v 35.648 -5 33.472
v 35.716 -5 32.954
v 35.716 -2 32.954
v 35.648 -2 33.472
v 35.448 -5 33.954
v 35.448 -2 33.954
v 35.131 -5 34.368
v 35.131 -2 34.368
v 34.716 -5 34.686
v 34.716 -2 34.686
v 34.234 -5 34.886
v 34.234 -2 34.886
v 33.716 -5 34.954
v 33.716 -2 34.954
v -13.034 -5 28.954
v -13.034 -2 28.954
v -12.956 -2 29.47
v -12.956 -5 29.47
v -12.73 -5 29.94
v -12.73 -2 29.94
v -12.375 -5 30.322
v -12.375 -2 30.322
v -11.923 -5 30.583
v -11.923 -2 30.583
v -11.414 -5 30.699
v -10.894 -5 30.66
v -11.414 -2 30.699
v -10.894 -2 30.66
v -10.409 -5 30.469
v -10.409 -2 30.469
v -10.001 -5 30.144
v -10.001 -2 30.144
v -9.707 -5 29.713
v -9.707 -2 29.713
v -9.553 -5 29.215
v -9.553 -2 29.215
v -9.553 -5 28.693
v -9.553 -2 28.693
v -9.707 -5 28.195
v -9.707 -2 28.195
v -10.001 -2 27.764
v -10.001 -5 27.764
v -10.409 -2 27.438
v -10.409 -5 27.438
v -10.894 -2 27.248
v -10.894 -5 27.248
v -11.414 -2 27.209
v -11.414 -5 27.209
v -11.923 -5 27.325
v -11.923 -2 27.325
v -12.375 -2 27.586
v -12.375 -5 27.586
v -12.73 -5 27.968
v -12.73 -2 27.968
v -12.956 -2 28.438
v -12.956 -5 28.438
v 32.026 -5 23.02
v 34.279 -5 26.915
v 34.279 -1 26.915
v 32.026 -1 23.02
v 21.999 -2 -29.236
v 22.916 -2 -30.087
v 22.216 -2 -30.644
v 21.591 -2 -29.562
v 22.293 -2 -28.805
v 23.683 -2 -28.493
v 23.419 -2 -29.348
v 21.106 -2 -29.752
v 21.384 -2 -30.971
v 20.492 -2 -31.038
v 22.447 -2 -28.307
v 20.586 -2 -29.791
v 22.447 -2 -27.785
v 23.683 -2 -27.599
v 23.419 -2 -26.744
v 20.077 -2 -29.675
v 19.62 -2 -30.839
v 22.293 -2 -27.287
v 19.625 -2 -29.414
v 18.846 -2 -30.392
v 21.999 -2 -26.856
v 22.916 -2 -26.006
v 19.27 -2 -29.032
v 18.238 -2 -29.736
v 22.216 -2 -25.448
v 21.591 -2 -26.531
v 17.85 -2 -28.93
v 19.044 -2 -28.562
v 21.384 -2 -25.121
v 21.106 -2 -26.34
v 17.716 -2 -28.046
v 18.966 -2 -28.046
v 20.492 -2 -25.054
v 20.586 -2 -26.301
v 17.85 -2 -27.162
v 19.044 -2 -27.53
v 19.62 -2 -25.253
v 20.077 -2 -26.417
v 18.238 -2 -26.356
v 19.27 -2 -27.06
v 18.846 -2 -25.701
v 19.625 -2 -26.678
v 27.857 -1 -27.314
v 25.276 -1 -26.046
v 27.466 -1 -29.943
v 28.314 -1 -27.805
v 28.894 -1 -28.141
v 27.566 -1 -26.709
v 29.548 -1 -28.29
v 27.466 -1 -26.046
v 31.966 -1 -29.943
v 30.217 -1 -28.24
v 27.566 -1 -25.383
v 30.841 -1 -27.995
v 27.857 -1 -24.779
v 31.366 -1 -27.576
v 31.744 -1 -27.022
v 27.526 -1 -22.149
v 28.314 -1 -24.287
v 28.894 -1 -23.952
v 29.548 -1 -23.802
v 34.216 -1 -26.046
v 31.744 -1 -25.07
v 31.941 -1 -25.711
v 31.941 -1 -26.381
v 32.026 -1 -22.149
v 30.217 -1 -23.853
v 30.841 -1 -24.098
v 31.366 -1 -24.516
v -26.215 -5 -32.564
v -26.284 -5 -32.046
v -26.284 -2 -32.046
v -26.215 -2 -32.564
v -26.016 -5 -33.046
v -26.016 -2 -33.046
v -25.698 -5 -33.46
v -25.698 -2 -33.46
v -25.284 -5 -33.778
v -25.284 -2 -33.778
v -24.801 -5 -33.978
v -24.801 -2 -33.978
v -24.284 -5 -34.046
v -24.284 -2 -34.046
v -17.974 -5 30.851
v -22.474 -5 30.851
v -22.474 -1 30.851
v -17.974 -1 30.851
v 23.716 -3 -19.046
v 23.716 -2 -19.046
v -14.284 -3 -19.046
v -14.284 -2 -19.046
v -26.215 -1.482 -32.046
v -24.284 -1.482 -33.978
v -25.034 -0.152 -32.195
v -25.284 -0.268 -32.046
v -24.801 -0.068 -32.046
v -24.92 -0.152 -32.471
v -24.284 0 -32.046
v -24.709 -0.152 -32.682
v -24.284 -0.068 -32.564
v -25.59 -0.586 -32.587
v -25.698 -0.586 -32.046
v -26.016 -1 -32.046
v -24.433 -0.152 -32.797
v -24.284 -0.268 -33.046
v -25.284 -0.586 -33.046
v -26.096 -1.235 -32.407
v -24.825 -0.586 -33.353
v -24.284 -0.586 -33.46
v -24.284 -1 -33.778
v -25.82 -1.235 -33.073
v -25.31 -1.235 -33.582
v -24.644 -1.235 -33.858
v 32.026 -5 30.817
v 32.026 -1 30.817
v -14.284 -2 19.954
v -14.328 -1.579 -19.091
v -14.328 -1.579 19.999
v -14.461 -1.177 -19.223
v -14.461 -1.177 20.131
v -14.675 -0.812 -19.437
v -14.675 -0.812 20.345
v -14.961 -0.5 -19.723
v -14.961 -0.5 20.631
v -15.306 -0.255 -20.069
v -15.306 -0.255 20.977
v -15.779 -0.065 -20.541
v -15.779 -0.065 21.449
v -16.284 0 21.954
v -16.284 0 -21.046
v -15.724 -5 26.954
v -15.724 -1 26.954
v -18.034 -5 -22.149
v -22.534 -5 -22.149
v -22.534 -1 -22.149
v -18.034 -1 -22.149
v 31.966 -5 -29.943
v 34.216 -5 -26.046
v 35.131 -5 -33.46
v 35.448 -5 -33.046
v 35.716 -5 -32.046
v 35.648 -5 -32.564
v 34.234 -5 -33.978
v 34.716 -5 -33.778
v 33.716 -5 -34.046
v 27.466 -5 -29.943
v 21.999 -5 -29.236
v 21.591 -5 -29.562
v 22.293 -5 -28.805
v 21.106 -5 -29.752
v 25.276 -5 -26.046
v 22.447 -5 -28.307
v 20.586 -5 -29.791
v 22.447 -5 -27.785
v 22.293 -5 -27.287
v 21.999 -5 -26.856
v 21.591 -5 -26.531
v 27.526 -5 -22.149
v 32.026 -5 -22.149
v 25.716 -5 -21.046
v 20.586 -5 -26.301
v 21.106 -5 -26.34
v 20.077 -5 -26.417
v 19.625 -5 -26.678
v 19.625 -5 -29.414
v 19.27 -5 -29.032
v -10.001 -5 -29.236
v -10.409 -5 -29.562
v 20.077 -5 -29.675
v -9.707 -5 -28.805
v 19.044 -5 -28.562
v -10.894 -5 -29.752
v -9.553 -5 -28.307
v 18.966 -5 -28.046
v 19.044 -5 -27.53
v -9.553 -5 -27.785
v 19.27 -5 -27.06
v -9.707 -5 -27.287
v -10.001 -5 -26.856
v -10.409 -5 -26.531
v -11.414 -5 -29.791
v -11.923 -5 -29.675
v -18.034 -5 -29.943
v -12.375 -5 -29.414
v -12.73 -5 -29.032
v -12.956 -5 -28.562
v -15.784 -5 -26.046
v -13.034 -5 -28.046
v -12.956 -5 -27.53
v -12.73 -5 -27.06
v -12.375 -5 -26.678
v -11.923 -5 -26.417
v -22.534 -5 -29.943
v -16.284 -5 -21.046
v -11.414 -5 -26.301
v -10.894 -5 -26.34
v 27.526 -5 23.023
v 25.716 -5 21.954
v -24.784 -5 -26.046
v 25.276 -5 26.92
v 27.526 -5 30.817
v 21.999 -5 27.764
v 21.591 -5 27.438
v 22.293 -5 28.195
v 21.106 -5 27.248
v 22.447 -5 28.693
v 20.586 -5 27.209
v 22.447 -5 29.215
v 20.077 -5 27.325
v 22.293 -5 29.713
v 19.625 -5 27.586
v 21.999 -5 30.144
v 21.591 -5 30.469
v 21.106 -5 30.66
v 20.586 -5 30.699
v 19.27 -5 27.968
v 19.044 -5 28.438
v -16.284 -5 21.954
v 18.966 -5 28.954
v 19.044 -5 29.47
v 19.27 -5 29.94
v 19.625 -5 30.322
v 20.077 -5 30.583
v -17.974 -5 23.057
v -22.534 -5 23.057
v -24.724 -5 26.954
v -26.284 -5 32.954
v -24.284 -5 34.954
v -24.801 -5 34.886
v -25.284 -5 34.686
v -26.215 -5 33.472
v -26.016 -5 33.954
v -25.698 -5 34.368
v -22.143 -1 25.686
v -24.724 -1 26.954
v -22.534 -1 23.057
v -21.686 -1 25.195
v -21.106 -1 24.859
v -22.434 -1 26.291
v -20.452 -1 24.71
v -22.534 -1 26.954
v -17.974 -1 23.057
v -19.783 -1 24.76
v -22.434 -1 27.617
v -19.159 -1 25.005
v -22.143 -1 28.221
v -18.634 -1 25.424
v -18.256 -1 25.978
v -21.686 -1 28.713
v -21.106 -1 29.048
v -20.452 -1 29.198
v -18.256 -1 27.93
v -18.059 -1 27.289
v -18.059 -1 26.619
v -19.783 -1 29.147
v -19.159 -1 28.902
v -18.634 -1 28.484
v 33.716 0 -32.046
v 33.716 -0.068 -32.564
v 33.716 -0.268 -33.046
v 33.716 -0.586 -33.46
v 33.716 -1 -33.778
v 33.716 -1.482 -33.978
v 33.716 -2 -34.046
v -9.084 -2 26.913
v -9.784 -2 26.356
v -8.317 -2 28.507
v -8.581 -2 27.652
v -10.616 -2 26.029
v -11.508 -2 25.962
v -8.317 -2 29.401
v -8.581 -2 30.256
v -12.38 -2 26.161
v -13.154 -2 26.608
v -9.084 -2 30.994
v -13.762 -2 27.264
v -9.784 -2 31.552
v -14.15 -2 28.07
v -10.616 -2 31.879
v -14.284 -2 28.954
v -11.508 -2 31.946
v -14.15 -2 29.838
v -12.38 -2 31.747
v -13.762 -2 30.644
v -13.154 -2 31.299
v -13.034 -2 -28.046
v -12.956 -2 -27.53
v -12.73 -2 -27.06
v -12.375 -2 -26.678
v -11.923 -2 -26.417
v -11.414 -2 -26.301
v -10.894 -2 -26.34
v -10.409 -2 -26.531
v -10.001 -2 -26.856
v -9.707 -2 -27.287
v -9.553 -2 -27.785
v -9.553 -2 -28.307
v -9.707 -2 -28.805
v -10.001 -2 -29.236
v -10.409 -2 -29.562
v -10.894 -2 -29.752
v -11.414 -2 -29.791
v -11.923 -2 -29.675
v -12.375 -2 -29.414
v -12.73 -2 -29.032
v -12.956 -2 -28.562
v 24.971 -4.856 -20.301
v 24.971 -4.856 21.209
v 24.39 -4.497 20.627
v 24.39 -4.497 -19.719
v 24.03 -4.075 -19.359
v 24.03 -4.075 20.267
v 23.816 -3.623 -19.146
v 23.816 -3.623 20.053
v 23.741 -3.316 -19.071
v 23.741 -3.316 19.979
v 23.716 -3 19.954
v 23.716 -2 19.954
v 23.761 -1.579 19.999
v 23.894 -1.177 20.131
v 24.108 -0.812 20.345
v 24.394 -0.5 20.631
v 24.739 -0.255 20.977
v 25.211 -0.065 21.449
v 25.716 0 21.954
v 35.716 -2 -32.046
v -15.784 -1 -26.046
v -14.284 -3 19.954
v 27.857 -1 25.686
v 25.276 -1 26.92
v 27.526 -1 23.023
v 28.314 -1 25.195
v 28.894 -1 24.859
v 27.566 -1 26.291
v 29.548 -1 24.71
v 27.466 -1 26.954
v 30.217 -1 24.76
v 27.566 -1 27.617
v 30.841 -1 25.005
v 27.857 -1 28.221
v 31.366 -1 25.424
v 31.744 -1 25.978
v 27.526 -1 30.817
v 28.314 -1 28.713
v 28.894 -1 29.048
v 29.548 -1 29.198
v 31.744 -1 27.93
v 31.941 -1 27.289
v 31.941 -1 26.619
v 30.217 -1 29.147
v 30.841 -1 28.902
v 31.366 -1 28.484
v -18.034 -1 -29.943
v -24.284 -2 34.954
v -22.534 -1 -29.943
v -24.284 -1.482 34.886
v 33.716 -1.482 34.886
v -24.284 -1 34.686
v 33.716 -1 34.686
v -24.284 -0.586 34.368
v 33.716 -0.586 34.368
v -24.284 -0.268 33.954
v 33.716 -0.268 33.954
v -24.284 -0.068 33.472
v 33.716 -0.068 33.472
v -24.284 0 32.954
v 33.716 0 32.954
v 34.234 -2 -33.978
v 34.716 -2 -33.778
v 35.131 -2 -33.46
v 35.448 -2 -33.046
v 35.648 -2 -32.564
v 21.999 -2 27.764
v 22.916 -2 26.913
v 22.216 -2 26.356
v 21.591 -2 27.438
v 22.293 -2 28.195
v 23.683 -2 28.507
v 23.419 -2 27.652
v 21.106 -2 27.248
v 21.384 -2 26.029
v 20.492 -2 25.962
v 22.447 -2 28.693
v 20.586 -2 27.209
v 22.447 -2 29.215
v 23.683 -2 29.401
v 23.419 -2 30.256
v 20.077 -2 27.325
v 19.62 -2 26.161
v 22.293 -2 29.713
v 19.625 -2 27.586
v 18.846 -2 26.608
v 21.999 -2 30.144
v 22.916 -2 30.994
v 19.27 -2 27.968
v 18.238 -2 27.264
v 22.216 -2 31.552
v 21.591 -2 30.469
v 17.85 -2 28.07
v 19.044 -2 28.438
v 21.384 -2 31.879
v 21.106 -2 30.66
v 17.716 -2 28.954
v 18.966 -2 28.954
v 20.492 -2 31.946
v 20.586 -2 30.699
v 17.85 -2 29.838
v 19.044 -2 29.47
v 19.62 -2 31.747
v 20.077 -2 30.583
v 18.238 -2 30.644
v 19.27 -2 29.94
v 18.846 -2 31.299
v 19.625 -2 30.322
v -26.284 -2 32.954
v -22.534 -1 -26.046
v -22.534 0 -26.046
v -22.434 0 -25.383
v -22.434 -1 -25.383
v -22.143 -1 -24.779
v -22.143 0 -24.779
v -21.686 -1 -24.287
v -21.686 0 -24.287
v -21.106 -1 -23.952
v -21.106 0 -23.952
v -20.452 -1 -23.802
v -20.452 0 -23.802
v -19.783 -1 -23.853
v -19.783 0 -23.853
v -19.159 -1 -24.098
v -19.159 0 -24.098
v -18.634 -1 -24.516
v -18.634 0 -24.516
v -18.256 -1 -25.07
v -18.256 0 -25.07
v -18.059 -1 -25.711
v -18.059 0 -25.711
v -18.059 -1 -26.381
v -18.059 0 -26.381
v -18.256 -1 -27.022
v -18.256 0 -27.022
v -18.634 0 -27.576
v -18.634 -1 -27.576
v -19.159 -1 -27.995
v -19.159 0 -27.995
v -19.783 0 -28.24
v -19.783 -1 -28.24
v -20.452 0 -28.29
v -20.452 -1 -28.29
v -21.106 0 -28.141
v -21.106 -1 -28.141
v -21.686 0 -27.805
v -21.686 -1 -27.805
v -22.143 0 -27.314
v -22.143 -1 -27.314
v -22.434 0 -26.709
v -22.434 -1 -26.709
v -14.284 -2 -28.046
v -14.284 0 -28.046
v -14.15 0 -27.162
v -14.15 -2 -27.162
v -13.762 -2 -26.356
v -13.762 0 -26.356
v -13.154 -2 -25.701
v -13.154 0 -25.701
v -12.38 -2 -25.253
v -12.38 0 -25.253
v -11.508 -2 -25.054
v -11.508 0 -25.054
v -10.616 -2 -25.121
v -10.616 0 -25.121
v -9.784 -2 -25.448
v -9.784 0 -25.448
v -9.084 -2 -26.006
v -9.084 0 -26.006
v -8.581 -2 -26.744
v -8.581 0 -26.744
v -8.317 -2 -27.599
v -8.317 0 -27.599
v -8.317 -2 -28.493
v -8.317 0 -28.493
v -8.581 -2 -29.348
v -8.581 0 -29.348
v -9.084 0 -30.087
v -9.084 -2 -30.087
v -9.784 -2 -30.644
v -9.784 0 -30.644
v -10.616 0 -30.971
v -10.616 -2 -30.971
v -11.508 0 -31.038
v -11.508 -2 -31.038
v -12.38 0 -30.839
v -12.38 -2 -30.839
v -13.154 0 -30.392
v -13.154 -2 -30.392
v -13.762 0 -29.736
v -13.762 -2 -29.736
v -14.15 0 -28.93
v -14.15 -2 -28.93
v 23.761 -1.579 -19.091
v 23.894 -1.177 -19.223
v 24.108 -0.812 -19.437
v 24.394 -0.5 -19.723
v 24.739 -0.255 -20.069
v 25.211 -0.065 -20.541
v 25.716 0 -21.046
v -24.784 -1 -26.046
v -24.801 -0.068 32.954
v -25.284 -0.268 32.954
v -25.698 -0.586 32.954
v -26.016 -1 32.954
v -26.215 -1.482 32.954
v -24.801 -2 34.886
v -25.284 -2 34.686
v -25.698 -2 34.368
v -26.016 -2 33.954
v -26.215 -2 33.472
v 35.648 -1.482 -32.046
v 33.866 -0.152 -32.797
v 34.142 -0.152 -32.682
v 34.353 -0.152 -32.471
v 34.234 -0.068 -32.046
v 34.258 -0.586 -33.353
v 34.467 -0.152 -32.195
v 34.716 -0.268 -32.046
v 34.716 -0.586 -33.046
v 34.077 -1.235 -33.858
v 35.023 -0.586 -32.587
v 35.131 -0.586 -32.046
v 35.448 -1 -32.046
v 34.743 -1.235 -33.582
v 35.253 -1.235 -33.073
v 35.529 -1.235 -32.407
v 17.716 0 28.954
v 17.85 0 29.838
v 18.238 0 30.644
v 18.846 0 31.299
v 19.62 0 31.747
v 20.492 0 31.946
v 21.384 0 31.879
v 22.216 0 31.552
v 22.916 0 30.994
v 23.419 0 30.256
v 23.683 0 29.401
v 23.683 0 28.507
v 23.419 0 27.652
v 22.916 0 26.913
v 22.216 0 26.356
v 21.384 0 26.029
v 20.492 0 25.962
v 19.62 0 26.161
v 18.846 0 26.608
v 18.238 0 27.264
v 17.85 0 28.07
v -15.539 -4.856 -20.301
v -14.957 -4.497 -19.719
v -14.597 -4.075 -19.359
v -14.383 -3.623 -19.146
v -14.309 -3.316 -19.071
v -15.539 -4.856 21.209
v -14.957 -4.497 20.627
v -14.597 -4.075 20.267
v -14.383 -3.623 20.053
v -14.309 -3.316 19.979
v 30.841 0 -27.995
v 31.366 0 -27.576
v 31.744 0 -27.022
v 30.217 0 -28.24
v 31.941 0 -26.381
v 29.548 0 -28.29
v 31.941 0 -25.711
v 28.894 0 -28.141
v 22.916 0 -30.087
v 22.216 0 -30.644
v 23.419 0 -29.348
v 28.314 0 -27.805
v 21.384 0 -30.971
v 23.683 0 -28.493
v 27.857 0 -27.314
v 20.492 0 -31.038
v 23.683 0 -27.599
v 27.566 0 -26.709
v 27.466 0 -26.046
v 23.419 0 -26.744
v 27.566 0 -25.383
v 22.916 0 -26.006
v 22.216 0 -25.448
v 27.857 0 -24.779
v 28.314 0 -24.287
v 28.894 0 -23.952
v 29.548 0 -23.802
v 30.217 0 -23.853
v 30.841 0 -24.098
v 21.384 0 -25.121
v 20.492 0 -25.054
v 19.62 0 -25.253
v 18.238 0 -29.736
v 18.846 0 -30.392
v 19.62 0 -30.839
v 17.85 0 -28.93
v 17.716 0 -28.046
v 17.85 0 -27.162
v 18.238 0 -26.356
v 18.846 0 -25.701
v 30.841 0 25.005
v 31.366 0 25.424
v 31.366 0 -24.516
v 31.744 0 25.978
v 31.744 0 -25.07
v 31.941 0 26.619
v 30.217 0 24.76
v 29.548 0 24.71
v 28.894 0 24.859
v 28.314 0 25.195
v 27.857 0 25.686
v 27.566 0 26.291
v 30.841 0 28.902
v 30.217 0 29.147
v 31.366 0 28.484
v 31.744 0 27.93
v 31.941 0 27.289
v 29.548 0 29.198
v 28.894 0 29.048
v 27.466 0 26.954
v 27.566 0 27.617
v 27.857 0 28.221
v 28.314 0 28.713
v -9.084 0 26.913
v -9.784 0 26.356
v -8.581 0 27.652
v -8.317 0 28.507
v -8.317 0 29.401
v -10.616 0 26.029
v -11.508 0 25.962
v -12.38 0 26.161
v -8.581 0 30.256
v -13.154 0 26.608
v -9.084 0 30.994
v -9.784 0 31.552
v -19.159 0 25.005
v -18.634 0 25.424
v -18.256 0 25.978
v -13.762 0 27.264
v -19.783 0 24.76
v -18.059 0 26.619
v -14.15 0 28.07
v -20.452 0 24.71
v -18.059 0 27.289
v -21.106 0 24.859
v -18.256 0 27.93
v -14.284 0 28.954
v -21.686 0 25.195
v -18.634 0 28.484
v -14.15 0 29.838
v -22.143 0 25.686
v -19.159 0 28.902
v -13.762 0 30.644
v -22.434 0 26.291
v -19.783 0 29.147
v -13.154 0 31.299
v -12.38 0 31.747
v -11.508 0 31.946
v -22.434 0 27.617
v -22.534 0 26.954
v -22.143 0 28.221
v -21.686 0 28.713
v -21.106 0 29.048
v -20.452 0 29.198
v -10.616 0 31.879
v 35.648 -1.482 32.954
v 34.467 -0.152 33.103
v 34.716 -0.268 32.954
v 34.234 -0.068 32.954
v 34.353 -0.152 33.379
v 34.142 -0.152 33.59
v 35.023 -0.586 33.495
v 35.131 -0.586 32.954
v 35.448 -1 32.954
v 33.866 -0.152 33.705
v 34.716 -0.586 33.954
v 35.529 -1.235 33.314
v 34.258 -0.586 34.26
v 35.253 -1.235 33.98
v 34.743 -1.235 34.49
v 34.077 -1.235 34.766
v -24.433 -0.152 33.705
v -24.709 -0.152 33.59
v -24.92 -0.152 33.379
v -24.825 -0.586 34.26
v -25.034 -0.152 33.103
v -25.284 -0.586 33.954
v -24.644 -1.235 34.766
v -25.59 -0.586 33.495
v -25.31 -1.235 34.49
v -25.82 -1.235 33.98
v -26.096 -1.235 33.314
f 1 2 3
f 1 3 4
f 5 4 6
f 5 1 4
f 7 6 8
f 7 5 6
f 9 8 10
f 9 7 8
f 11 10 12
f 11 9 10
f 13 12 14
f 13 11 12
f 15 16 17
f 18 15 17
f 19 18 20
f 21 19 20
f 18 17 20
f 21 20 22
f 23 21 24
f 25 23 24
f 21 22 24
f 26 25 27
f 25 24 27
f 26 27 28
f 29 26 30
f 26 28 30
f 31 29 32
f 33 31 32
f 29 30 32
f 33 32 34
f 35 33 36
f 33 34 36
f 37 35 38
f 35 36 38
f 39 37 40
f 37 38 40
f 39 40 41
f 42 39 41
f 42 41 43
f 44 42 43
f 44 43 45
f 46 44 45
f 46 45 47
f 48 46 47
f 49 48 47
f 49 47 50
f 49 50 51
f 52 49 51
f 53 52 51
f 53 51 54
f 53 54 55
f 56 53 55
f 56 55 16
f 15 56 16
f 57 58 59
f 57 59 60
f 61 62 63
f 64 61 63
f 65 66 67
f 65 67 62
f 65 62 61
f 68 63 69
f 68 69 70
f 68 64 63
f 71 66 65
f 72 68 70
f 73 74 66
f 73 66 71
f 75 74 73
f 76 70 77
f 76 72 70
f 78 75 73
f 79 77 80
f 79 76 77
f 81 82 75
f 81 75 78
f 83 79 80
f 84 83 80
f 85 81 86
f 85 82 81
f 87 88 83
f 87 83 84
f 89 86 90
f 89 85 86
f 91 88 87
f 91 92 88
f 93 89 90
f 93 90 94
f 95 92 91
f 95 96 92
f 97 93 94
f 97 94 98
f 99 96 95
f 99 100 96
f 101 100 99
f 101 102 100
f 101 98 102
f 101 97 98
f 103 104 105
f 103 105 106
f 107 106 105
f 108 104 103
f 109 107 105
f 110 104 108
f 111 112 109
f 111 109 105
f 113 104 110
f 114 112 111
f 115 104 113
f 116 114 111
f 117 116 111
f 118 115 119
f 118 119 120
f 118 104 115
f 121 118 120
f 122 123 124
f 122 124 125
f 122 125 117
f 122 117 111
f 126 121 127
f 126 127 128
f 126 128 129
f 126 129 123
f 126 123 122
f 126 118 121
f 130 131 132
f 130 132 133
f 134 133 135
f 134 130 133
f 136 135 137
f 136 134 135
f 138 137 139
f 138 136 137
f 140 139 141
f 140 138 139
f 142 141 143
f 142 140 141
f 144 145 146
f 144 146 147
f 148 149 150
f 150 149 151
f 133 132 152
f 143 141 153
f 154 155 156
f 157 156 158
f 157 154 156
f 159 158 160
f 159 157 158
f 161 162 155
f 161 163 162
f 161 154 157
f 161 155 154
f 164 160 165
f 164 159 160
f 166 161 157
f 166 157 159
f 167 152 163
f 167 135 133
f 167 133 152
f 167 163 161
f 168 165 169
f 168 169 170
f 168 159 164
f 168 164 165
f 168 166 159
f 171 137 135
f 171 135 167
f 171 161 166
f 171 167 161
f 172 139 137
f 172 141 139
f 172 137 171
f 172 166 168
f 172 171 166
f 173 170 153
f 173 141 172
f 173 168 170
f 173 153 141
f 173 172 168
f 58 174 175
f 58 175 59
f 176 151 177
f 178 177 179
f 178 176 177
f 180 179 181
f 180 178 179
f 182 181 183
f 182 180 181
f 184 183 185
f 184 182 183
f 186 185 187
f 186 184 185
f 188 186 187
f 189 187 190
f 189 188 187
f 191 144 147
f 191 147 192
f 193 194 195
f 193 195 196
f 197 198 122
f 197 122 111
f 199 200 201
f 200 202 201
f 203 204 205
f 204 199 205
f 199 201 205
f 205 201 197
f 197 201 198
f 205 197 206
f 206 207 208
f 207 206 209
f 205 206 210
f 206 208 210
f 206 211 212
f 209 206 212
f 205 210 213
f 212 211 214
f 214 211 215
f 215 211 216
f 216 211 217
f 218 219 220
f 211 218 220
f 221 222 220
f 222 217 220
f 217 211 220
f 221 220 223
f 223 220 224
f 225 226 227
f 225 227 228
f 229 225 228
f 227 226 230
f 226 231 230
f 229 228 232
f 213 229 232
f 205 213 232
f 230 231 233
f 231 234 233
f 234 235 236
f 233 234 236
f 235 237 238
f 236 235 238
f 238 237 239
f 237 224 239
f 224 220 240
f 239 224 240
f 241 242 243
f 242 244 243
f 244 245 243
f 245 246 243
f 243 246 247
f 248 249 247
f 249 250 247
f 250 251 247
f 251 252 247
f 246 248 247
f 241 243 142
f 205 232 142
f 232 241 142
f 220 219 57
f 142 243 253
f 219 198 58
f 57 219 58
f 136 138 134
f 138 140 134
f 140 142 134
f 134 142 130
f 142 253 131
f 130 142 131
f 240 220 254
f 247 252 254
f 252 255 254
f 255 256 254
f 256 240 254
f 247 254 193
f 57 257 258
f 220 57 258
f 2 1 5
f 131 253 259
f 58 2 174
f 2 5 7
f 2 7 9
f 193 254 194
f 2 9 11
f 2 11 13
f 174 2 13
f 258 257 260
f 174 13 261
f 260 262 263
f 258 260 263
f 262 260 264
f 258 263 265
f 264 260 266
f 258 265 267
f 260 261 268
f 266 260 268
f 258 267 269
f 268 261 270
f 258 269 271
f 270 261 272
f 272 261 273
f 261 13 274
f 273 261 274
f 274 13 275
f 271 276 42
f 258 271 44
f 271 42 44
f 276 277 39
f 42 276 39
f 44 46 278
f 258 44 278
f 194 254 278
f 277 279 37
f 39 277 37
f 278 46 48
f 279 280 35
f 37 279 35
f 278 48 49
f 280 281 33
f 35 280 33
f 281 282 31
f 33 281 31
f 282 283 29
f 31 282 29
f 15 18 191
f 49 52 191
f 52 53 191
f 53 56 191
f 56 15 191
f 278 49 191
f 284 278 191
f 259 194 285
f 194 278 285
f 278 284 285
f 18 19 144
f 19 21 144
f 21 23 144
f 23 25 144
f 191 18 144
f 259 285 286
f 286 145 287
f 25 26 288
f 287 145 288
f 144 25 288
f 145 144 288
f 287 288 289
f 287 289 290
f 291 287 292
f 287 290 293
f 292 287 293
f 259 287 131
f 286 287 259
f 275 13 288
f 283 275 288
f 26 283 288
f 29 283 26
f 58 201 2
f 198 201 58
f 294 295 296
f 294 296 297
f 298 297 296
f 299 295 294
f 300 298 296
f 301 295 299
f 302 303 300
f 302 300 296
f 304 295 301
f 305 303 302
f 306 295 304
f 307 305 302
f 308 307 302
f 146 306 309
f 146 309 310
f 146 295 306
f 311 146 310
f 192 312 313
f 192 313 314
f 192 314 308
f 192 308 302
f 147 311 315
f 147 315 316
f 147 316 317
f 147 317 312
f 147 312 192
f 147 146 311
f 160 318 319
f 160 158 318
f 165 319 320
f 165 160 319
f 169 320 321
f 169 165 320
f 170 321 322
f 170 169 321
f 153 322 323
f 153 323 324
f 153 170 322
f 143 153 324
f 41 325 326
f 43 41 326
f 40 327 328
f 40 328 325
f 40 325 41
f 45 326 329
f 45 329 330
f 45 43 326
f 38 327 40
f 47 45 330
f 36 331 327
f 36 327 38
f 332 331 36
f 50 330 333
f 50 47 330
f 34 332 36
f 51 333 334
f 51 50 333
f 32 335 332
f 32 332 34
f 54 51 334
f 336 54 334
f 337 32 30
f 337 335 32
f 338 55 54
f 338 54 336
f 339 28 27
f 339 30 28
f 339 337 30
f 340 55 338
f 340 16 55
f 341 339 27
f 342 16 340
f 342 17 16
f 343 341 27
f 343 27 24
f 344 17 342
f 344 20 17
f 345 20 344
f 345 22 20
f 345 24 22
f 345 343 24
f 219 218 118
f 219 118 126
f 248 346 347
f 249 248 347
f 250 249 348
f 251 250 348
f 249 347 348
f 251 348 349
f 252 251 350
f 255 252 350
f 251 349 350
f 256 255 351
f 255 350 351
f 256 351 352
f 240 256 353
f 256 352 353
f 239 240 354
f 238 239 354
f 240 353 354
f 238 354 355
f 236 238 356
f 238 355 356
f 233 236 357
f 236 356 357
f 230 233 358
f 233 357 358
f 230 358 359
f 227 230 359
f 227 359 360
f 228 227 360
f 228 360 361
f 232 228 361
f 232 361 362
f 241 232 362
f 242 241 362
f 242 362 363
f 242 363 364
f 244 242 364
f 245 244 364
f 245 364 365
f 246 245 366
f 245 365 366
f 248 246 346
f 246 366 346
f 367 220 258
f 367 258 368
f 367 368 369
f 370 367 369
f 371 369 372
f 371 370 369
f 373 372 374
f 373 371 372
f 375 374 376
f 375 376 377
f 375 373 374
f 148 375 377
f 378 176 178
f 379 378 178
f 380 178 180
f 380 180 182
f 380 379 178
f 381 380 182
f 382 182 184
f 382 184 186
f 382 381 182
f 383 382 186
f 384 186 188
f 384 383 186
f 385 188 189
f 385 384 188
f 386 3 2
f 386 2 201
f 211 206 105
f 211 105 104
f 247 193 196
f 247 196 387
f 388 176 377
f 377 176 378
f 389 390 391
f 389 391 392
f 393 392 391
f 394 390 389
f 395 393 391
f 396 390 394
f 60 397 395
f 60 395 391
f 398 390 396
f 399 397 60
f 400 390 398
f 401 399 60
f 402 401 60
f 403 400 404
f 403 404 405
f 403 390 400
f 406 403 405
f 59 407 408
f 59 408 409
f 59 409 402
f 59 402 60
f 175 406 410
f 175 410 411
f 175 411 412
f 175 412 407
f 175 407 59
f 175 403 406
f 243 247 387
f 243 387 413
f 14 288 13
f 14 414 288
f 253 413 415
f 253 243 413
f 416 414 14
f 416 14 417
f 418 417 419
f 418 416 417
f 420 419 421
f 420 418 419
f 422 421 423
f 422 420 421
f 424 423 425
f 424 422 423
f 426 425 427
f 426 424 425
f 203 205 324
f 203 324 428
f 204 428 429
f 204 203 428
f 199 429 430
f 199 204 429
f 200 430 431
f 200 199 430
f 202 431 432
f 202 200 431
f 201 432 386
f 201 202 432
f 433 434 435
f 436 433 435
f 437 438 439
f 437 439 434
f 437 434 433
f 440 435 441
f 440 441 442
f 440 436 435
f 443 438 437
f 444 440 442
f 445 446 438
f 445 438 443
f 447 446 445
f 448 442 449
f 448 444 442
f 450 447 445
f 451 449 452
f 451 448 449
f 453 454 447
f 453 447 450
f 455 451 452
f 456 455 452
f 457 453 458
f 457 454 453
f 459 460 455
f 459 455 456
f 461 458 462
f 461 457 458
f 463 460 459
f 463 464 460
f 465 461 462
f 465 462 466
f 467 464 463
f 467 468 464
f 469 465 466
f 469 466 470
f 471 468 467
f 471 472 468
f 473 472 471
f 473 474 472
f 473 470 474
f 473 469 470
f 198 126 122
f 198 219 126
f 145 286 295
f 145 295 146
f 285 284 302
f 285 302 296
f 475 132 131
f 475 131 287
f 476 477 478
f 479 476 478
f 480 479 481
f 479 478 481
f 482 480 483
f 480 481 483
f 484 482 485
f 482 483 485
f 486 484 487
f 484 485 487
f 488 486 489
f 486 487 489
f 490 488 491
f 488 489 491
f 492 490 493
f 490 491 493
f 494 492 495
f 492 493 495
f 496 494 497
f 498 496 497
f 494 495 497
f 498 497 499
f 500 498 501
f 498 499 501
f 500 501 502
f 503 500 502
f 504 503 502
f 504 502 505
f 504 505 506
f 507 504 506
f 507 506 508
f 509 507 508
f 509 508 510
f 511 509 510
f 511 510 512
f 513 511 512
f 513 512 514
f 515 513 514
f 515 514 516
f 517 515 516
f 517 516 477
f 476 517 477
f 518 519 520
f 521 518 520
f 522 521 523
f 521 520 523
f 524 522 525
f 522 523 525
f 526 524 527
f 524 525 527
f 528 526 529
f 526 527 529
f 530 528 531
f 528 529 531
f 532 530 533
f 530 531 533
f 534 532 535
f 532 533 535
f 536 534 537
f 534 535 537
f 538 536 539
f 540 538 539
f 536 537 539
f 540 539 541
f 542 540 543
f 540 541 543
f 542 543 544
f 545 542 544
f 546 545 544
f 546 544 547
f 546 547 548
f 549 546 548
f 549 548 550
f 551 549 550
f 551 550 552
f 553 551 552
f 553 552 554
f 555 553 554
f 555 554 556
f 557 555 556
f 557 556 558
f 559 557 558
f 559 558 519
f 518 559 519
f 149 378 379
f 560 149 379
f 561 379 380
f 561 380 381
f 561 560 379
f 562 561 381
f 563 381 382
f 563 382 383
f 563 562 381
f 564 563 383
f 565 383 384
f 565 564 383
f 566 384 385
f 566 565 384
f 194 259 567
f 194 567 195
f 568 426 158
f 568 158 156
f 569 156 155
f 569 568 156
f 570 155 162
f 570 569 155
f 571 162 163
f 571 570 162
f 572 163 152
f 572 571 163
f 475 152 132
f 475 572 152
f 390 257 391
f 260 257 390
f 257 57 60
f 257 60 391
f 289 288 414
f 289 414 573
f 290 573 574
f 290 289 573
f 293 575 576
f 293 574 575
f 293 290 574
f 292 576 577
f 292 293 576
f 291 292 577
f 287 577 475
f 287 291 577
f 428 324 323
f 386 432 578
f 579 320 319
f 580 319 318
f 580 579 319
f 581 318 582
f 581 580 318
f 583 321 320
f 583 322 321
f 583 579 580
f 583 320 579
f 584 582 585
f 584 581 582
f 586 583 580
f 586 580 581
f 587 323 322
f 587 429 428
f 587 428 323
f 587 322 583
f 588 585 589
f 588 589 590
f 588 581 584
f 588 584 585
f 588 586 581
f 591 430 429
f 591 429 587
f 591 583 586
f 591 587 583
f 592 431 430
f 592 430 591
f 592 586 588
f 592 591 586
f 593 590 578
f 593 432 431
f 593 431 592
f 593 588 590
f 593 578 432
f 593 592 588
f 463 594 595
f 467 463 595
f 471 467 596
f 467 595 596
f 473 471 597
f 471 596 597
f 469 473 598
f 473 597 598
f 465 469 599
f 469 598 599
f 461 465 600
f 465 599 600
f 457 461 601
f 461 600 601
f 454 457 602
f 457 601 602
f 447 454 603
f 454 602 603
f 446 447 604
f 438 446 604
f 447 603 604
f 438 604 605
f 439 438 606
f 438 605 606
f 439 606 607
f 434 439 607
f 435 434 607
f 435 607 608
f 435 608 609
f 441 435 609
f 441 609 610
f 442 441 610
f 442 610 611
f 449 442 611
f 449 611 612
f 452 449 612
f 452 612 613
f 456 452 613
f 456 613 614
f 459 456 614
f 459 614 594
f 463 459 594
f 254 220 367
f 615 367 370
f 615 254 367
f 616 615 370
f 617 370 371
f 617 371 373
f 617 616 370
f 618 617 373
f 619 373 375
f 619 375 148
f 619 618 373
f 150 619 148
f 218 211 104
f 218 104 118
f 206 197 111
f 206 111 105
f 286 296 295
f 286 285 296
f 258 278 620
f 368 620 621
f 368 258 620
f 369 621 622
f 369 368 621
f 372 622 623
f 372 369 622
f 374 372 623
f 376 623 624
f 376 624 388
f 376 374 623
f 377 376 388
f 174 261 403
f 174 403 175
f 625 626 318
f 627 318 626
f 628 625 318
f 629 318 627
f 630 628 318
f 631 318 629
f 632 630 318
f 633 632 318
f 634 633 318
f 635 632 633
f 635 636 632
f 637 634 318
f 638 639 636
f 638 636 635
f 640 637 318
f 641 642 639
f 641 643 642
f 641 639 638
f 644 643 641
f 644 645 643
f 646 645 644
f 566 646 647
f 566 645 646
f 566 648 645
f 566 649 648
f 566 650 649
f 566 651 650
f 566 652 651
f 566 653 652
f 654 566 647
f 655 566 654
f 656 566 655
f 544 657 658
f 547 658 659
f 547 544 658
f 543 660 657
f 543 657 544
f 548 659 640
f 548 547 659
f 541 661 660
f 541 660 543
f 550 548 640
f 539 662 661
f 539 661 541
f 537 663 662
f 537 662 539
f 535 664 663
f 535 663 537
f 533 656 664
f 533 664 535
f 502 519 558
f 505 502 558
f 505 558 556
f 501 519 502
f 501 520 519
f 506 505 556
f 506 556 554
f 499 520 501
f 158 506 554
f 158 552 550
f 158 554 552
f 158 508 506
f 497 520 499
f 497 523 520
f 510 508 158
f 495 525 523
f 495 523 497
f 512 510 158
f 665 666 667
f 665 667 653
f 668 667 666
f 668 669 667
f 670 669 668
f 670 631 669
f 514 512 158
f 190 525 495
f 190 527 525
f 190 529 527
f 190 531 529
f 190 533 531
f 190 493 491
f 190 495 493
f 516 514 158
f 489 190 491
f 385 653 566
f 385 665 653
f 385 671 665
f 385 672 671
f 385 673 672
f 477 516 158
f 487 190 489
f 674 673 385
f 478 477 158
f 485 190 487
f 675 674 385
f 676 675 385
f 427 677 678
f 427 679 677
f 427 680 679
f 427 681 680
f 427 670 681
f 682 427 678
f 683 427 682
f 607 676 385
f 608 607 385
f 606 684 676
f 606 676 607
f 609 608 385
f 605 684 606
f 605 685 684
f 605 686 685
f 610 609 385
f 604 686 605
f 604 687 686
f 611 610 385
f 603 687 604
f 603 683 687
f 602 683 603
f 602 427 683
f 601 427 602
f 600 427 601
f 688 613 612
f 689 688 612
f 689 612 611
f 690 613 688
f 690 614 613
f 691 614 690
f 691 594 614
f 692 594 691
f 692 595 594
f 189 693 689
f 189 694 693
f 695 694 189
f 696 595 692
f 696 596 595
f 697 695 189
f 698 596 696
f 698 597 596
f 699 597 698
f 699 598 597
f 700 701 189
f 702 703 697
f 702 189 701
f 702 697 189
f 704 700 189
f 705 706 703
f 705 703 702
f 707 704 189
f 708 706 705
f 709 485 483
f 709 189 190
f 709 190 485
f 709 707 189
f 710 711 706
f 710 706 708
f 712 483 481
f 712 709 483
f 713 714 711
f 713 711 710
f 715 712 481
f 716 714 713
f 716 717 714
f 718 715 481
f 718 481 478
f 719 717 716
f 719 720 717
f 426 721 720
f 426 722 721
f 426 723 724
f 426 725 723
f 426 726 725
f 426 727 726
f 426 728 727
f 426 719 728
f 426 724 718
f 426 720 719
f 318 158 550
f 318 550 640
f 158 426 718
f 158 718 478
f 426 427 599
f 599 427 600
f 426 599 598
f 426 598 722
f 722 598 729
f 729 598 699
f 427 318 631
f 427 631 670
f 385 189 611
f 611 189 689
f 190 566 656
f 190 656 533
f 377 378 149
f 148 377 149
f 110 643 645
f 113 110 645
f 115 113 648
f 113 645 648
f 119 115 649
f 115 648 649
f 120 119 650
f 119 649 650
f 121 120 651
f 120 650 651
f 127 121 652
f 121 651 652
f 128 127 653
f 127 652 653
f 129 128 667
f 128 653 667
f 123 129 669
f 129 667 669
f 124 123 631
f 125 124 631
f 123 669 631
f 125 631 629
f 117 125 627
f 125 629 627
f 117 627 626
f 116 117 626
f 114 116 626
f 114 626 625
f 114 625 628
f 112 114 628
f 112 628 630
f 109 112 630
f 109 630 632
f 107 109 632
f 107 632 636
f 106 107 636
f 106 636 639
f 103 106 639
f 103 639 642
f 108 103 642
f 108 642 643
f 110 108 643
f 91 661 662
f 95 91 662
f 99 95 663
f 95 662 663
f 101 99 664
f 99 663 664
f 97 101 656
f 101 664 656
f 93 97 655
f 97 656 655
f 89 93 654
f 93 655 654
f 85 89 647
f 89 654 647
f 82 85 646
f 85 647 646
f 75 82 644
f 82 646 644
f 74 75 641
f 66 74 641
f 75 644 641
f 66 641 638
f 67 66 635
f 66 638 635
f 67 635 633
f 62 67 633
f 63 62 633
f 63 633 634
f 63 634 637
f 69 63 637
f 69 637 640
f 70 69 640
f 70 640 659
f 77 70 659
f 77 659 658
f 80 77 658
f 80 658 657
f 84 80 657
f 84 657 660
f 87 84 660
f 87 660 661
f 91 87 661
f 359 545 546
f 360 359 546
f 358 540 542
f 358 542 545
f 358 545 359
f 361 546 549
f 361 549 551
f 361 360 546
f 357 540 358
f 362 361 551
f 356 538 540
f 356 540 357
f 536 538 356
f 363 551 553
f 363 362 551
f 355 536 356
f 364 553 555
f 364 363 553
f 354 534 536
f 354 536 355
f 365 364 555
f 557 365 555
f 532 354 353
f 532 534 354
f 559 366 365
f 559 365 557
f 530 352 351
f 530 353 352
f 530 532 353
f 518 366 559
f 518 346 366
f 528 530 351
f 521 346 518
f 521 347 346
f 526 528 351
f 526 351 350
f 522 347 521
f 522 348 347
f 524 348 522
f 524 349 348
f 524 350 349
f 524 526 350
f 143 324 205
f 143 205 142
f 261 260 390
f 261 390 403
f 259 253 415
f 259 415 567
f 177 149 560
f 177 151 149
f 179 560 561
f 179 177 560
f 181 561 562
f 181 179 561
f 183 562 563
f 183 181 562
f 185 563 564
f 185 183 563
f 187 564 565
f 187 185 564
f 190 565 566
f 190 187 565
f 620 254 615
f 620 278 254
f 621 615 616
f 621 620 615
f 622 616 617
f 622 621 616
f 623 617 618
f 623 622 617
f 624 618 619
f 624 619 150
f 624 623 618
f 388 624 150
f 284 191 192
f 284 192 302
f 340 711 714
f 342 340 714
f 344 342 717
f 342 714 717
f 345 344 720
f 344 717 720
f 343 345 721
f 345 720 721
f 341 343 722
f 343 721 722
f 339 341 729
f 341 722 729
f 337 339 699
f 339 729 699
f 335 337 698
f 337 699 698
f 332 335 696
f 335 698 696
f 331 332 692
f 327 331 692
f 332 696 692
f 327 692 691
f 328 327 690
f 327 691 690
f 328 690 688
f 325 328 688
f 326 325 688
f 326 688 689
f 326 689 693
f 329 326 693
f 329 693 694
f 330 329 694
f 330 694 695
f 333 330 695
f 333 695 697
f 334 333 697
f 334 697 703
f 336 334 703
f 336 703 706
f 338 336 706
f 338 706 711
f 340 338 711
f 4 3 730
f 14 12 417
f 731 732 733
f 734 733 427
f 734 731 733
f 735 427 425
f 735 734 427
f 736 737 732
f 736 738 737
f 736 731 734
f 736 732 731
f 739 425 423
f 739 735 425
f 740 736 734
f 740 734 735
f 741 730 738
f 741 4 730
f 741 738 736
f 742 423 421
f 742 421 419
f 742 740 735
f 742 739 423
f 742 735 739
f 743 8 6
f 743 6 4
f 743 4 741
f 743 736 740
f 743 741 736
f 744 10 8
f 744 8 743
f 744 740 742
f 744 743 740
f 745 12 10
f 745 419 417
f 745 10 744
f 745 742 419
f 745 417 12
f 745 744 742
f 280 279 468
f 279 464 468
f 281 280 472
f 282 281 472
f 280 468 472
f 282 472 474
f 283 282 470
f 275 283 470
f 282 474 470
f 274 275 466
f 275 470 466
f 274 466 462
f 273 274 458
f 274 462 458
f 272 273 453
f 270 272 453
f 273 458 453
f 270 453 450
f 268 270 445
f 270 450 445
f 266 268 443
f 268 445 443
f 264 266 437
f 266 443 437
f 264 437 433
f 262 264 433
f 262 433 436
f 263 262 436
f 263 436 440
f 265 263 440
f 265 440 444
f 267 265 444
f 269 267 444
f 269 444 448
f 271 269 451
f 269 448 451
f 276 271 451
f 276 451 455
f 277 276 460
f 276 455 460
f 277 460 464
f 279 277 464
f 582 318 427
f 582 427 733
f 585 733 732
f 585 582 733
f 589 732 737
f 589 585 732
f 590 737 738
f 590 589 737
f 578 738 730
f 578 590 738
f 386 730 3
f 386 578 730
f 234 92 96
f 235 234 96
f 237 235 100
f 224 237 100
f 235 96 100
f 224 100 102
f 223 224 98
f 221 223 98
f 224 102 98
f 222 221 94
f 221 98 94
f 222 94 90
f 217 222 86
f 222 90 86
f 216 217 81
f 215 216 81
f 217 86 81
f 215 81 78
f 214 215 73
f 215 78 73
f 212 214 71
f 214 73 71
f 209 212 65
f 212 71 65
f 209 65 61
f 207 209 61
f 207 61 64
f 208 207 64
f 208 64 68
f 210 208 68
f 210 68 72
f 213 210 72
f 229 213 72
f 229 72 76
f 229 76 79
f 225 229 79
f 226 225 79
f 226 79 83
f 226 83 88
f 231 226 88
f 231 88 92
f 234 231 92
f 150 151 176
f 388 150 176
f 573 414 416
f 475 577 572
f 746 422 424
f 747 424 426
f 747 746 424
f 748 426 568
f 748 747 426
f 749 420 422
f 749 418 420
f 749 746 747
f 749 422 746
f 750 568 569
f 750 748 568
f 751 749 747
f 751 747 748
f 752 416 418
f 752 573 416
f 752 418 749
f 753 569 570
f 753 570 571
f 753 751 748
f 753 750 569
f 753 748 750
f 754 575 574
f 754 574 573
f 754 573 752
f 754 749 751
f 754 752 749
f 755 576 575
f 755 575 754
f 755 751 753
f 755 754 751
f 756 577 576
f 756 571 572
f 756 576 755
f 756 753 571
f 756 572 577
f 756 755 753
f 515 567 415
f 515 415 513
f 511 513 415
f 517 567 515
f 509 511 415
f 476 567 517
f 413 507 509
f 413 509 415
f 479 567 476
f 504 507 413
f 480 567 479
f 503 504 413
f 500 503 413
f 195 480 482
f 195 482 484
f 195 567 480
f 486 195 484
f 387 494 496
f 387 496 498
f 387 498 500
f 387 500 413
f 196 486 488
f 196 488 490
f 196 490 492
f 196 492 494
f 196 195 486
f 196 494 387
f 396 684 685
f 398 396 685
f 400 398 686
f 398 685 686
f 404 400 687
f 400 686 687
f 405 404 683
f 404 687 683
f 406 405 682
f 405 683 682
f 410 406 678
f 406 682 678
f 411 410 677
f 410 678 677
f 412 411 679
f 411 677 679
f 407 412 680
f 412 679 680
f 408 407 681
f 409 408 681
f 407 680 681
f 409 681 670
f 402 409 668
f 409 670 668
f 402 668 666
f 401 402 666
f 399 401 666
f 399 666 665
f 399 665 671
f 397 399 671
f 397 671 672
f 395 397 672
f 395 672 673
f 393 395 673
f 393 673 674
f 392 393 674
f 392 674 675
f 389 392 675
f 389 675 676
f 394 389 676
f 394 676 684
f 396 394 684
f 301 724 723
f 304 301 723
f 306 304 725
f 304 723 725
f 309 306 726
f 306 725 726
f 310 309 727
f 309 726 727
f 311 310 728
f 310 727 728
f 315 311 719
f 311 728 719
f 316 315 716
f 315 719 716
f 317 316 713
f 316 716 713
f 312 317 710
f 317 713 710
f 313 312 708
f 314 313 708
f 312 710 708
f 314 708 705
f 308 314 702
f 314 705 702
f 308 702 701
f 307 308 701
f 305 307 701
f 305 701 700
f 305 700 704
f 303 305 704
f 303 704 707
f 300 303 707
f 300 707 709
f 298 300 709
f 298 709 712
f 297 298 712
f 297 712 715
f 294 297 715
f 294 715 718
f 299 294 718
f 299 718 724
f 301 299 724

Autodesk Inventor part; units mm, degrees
ref_plane "YZ Plane" through (0, 0, 0) normal (1, 0, 0) x (0, 1, 0)
ref_plane "XZ Plane" through (0, 0, 0) normal (0, 1, 0) x (-1, 0, 0)
ref_plane "XY Plane" through (0, 0, 0) normal (0, 0, 1) x (1, 0, 0)
sketch "Sketch1" plane through (0, 0, 0) normal (0, 1, 0) x (-1, 0, 0)
  line L0 (26.2836, 34.9539) -> (-35.7164, 34.9539)
  line L1 (-35.7164, 34.9539) -> (-35.7164, -34.0461)
  line L2 (-35.7164, -34.0461) -> (26.2836, -34.0461)
  line L3 (26.2836, -34.0461) -> (26.2836, 34.9539)
  circle A0 centre (11.2836, -28.0461) radius 1.75
  circle A1 centre (11.2836, -28.0461) radius 3
  circle A2 centre (-20.7164, -28.0461) radius 1.75
  circle A3 centre (-20.7164, -28.0461) radius 3
  circle A4 centre (-20.7164, 28.9539) radius 1.75
  circle A5 centre (-20.7164, 28.9539) radius 3
  circle A6 centre (11.2836, 28.9539) radius 1.75
  circle A7 centre (11.2836, 28.9539) radius 3
  line L4 (-15.7164, 34.9539) -> (-25.7164, 34.9539)
  circle A8 centre (20.2836, 26.9539) radius 2.25
  circle A9 centre (20.2836, -26.0461) radius 2.25
  circle A10 centre (-29.7164, 26.9539) radius 2.25
  circle A11 centre (-29.7164, -26.0461) radius 2.25
  circle A12 centre (20.2836, 26.9539) radius 4.5
  circle A13 centre (20.2836, -26.0461) radius 4.5
  circle A14 centre (-29.7164, -26.0461) radius 4.5
  circle A15 centre (-29.7164, 26.9539) radius 4.5
  line L5 (18.0336, 23.0568) -> (15.7836, 26.9539)
  line L6 (15.7836, 26.9539) -> (18.0336, 30.8511)
  line L7 (18.0336, 30.8511) -> (22.5336, 30.8511)
  line L8 (22.5336, 30.8511) -> (24.7836, 26.9539)
  line L9 (24.7836, 26.9539) -> (22.5336, 23.0568)
  line L10 (22.5336, 23.0568) -> (18.0336, 23.0568)
  line L11 (18.0336, -29.9432) -> (15.7836, -26.0461)
  line L12 (15.7836, -26.0461) -> (18.0336, -22.1489)
  line L13 (18.0336, -22.1489) -> (22.5336, -22.1489)
  line L14 (22.5336, -22.1489) -> (24.7836, -26.0461)
  line L15 (24.7836, -26.0461) -> (22.5336, -29.9432)
  line L16 (22.5336, -29.9432) -> (18.0336, -29.9432)
  line L17 (-31.9664, -29.9432) -> (-34.2164, -26.0461)
  line L18 (-34.2164, -26.0461) -> (-31.9664, -22.1489)
  line L19 (-31.9664, -22.1489) -> (-27.4664, -22.1489)
  line L20 (-27.4664, -22.1489) -> (-25.2164, -26.0461)
  line L21 (-25.2164, -26.0461) -> (-27.4664, -29.9432)
  line L22 (-27.4664, -29.9432) -> (-31.9664, -29.9432)
  line L23 (-31.9664, 23.0568) -> (-34.2164, 26.9539)
  line L24 (-34.2164, 26.9539) -> (-31.9664, 30.8511)
  line L25 (-31.9664, 30.8511) -> (-27.4664, 30.8511)
  line L26 (-27.4664, 30.8511) -> (-25.2164, 26.9539)
  line L27 (-25.2164, 26.9539) -> (-27.4664, 23.0568)
  line L28 (-27.4664, 23.0568) -> (-31.9664, 23.0568)
  point P0 (0, 0)
  dimension "d45" = 9
  dimension "d46" = 9
  dimension "d47" = 9
  dimension "d48" = 9
  dimension "d0" = 69
  dimension "d1" = 62
  dimension "d2" = 3.5
  dimension "d3" = 6
  dimension "d4" = 3.5
  dimension "d5" = 6
  dimension "d6" = 3.5
  dimension "d7" = 6
  dimension "d8" = 3.5
  dimension "d9" = 6
  dimension "d10" = 15
  dimension "d11" = 15
  dimension "d12" = 15
  dimension "d13" = 15
  dimension "d14" = 6
  dimension "d15" = 6
  dimension "d16" = 6
  dimension "d17" = 6
  dimension "d32" = 4.5
  dimension "d33" = 4.5
  dimension "d34" = 4.5
  dimension "d35" = 4.5
  dimension "d36" = 8
  dimension "d37" = 8
  dimension "d38" = 8
  dimension "d39" = 8
  dimension "d40" = 6
  dimension "d41" = 6
  dimension "d42" = 6
  dimension "d43" = 6
  dimension "d44" = 53
extrude "Extrusion1" add sketch "Sketch1" against normal blind 5 contours L3 L2 L1 L0 | A1 | A3 | A5 | A7 | L8 A12 | L9 L10 L5 L6 L7 L8 | A12 L9 | L7 A12 | A12 L10 | L6 A12 | A12 L5 | L14 A13 | L15 L16 L11 L12 L13 L14 | A13 L15 | L13 A13 | A13 L16 | L12 A13 | A13 L11 | L20 A14 | L21 L22 L17 L18 L19 L20 | A14 L21 | L19 A14 | A14 L22 | L18 A14 | A14 L17 | L26 A15 | L27 L28 L23 L24 L25 L26 | A15 L27 | L25 A15 | A15 L28 | L24 A15 | A15 L23
extrude "Extrusion2" cut sketch "Sketch1" against normal blind 2 contours A1 | A3 | A5 | A7
sketch "Sketch2" plane through (0, -5, 0) normal (0, -1, 0) x (1, 0, 0)
  line L0 (27.5264, 23.0228) -> (25.2764, 26.92)
  line L1 (25.2764, 26.92) -> (27.5264, 30.8171)
  line L2 (27.5264, 30.8171) -> (32.0264, 30.8171)
  line L3 (32.0264, 30.8171) -> (34.279, 26.9154)
  line L4 (34.279, 26.9154) -> (32.0264, 23.0198)
  line L5 (32.0264, 23.0198) -> (27.5264, 23.0228)
  line L6 (27.4664, -29.9432) -> (25.2764, -26.0461)
  line L7 (25.2764, -26.0461) -> (27.5264, -22.1489)
  line L8 (27.5264, -22.1489) -> (32.0264, -22.1489)
  line L9 (32.0264, -22.1489) -> (34.2164, -26.0461)
  line L10 (34.2164, -26.0461) -> (31.9664, -29.9432)
  line L11 (31.9664, -29.9432) -> (27.4664, -29.9432)
  line L12 (-22.5336, -29.9432) -> (-24.7836, -26.0461)
  line L13 (-24.7836, -26.0461) -> (-22.5336, -22.1489)
  line L14 (-22.5336, -22.1489) -> (-18.0336, -22.1489)
  line L15 (-18.0336, -22.1489) -> (-15.7836, -26.0461)
  line L16 (-15.7836, -26.0461) -> (-18.0336, -29.9432)
  line L17 (-18.0336, -29.9432) -> (-22.5336, -29.9432)
  line L18 (-22.5336, 23.0568) -> (-24.7236, 26.9539)
  line L19 (-24.7236, 26.9539) -> (-22.4736, 30.8511)
  line L20 (-22.4736, 30.8511) -> (-17.9736, 30.8511)
  line L21 (-17.9736, 30.8511) -> (-15.7236, 26.9539)
  line L22 (-15.7236, 26.9539) -> (-17.9736, 23.0568)
  line L23 (-17.9736, 23.0568) -> (-22.5336, 23.0568)
  line L24 (-26.2836, 34.9539) -> (-26.2836, -34.0461) projected
  line L25 (35.7164, 34.9539) -> (-26.2836, 34.9539) projected
  line L26 (35.7164, -34.0461) -> (35.7164, 34.9539) projected
  line L27 (-26.2836, -34.0461) -> (35.7164, -34.0461) projected
  point P0 (0, 0)
extrude "Extrusion3" cut sketch "Sketch2" against normal blind 4 contours L0 L1 L2 L3 L4 L5 | L6 L7 L8 L9 L10 L11 | L12 L13 L14 L15 L16 L17 | L18 L19 L20 L21 L22 L23
fillet "Fillet1" radius 2 8 edges at (35.7164, -2.5, -34.0461) (35.7164, -2.5, 34.9539) (-26.2836, -2.5, 34.9539) (-26.2836, -2.5, -34.0461) (-26.2836, 0, 0.4539) (4.7164, 0, -34.0461) (4.7164, 0, 34.9539) (35.7164, 0, 0.4539)
sketch "Sketch3" plane through (0, 0, 0) normal (0, 1, 0) x (1, 0, 0)
  line L0 (23.7164, 19.0461) -> (-14.2836, 19.0461)
  line L1 (-14.2836, 19.0461) -> (-14.2836, -19.9539)
  line L2 (-14.2836, -19.9539) -> (23.7164, -19.9539)
  line L3 (23.7164, -19.9539) -> (23.7164, 19.0461)
  line L4 (35.7164, -32.9539) -> (35.7164, 32.0461) projected
  line L5 (-26.2836, 32.0461) -> (-26.2836, -32.9539) projected
  line L6 (-24.2836, -34.9539) -> (33.7164, -34.9539) projected
  line L7 (33.7164, 34.0461) -> (-24.2836, 34.0461) projected
  point P0 (0, 0)
  dimension "d68" = 12
  dimension "d69" = 12
  dimension "d70" = 15
  dimension "d71" = 15
extrude "Extrusion4" cut sketch "Sketch3" against normal through all
fillet "Fillet2" radius 2 8 edges at (4.7164, 0, -19.0461) (23.7164, 0, 0.4539) (4.7164, 0, 19.9539) (-14.2836, 0, 0.4539) (4.7164, -5, 19.9539) (-14.2836, -5, 0.4539) (4.7164, -5, -19.0461) (23.7164, -5, 0.4539)
properties part number "BatteryHolder2PBase"
